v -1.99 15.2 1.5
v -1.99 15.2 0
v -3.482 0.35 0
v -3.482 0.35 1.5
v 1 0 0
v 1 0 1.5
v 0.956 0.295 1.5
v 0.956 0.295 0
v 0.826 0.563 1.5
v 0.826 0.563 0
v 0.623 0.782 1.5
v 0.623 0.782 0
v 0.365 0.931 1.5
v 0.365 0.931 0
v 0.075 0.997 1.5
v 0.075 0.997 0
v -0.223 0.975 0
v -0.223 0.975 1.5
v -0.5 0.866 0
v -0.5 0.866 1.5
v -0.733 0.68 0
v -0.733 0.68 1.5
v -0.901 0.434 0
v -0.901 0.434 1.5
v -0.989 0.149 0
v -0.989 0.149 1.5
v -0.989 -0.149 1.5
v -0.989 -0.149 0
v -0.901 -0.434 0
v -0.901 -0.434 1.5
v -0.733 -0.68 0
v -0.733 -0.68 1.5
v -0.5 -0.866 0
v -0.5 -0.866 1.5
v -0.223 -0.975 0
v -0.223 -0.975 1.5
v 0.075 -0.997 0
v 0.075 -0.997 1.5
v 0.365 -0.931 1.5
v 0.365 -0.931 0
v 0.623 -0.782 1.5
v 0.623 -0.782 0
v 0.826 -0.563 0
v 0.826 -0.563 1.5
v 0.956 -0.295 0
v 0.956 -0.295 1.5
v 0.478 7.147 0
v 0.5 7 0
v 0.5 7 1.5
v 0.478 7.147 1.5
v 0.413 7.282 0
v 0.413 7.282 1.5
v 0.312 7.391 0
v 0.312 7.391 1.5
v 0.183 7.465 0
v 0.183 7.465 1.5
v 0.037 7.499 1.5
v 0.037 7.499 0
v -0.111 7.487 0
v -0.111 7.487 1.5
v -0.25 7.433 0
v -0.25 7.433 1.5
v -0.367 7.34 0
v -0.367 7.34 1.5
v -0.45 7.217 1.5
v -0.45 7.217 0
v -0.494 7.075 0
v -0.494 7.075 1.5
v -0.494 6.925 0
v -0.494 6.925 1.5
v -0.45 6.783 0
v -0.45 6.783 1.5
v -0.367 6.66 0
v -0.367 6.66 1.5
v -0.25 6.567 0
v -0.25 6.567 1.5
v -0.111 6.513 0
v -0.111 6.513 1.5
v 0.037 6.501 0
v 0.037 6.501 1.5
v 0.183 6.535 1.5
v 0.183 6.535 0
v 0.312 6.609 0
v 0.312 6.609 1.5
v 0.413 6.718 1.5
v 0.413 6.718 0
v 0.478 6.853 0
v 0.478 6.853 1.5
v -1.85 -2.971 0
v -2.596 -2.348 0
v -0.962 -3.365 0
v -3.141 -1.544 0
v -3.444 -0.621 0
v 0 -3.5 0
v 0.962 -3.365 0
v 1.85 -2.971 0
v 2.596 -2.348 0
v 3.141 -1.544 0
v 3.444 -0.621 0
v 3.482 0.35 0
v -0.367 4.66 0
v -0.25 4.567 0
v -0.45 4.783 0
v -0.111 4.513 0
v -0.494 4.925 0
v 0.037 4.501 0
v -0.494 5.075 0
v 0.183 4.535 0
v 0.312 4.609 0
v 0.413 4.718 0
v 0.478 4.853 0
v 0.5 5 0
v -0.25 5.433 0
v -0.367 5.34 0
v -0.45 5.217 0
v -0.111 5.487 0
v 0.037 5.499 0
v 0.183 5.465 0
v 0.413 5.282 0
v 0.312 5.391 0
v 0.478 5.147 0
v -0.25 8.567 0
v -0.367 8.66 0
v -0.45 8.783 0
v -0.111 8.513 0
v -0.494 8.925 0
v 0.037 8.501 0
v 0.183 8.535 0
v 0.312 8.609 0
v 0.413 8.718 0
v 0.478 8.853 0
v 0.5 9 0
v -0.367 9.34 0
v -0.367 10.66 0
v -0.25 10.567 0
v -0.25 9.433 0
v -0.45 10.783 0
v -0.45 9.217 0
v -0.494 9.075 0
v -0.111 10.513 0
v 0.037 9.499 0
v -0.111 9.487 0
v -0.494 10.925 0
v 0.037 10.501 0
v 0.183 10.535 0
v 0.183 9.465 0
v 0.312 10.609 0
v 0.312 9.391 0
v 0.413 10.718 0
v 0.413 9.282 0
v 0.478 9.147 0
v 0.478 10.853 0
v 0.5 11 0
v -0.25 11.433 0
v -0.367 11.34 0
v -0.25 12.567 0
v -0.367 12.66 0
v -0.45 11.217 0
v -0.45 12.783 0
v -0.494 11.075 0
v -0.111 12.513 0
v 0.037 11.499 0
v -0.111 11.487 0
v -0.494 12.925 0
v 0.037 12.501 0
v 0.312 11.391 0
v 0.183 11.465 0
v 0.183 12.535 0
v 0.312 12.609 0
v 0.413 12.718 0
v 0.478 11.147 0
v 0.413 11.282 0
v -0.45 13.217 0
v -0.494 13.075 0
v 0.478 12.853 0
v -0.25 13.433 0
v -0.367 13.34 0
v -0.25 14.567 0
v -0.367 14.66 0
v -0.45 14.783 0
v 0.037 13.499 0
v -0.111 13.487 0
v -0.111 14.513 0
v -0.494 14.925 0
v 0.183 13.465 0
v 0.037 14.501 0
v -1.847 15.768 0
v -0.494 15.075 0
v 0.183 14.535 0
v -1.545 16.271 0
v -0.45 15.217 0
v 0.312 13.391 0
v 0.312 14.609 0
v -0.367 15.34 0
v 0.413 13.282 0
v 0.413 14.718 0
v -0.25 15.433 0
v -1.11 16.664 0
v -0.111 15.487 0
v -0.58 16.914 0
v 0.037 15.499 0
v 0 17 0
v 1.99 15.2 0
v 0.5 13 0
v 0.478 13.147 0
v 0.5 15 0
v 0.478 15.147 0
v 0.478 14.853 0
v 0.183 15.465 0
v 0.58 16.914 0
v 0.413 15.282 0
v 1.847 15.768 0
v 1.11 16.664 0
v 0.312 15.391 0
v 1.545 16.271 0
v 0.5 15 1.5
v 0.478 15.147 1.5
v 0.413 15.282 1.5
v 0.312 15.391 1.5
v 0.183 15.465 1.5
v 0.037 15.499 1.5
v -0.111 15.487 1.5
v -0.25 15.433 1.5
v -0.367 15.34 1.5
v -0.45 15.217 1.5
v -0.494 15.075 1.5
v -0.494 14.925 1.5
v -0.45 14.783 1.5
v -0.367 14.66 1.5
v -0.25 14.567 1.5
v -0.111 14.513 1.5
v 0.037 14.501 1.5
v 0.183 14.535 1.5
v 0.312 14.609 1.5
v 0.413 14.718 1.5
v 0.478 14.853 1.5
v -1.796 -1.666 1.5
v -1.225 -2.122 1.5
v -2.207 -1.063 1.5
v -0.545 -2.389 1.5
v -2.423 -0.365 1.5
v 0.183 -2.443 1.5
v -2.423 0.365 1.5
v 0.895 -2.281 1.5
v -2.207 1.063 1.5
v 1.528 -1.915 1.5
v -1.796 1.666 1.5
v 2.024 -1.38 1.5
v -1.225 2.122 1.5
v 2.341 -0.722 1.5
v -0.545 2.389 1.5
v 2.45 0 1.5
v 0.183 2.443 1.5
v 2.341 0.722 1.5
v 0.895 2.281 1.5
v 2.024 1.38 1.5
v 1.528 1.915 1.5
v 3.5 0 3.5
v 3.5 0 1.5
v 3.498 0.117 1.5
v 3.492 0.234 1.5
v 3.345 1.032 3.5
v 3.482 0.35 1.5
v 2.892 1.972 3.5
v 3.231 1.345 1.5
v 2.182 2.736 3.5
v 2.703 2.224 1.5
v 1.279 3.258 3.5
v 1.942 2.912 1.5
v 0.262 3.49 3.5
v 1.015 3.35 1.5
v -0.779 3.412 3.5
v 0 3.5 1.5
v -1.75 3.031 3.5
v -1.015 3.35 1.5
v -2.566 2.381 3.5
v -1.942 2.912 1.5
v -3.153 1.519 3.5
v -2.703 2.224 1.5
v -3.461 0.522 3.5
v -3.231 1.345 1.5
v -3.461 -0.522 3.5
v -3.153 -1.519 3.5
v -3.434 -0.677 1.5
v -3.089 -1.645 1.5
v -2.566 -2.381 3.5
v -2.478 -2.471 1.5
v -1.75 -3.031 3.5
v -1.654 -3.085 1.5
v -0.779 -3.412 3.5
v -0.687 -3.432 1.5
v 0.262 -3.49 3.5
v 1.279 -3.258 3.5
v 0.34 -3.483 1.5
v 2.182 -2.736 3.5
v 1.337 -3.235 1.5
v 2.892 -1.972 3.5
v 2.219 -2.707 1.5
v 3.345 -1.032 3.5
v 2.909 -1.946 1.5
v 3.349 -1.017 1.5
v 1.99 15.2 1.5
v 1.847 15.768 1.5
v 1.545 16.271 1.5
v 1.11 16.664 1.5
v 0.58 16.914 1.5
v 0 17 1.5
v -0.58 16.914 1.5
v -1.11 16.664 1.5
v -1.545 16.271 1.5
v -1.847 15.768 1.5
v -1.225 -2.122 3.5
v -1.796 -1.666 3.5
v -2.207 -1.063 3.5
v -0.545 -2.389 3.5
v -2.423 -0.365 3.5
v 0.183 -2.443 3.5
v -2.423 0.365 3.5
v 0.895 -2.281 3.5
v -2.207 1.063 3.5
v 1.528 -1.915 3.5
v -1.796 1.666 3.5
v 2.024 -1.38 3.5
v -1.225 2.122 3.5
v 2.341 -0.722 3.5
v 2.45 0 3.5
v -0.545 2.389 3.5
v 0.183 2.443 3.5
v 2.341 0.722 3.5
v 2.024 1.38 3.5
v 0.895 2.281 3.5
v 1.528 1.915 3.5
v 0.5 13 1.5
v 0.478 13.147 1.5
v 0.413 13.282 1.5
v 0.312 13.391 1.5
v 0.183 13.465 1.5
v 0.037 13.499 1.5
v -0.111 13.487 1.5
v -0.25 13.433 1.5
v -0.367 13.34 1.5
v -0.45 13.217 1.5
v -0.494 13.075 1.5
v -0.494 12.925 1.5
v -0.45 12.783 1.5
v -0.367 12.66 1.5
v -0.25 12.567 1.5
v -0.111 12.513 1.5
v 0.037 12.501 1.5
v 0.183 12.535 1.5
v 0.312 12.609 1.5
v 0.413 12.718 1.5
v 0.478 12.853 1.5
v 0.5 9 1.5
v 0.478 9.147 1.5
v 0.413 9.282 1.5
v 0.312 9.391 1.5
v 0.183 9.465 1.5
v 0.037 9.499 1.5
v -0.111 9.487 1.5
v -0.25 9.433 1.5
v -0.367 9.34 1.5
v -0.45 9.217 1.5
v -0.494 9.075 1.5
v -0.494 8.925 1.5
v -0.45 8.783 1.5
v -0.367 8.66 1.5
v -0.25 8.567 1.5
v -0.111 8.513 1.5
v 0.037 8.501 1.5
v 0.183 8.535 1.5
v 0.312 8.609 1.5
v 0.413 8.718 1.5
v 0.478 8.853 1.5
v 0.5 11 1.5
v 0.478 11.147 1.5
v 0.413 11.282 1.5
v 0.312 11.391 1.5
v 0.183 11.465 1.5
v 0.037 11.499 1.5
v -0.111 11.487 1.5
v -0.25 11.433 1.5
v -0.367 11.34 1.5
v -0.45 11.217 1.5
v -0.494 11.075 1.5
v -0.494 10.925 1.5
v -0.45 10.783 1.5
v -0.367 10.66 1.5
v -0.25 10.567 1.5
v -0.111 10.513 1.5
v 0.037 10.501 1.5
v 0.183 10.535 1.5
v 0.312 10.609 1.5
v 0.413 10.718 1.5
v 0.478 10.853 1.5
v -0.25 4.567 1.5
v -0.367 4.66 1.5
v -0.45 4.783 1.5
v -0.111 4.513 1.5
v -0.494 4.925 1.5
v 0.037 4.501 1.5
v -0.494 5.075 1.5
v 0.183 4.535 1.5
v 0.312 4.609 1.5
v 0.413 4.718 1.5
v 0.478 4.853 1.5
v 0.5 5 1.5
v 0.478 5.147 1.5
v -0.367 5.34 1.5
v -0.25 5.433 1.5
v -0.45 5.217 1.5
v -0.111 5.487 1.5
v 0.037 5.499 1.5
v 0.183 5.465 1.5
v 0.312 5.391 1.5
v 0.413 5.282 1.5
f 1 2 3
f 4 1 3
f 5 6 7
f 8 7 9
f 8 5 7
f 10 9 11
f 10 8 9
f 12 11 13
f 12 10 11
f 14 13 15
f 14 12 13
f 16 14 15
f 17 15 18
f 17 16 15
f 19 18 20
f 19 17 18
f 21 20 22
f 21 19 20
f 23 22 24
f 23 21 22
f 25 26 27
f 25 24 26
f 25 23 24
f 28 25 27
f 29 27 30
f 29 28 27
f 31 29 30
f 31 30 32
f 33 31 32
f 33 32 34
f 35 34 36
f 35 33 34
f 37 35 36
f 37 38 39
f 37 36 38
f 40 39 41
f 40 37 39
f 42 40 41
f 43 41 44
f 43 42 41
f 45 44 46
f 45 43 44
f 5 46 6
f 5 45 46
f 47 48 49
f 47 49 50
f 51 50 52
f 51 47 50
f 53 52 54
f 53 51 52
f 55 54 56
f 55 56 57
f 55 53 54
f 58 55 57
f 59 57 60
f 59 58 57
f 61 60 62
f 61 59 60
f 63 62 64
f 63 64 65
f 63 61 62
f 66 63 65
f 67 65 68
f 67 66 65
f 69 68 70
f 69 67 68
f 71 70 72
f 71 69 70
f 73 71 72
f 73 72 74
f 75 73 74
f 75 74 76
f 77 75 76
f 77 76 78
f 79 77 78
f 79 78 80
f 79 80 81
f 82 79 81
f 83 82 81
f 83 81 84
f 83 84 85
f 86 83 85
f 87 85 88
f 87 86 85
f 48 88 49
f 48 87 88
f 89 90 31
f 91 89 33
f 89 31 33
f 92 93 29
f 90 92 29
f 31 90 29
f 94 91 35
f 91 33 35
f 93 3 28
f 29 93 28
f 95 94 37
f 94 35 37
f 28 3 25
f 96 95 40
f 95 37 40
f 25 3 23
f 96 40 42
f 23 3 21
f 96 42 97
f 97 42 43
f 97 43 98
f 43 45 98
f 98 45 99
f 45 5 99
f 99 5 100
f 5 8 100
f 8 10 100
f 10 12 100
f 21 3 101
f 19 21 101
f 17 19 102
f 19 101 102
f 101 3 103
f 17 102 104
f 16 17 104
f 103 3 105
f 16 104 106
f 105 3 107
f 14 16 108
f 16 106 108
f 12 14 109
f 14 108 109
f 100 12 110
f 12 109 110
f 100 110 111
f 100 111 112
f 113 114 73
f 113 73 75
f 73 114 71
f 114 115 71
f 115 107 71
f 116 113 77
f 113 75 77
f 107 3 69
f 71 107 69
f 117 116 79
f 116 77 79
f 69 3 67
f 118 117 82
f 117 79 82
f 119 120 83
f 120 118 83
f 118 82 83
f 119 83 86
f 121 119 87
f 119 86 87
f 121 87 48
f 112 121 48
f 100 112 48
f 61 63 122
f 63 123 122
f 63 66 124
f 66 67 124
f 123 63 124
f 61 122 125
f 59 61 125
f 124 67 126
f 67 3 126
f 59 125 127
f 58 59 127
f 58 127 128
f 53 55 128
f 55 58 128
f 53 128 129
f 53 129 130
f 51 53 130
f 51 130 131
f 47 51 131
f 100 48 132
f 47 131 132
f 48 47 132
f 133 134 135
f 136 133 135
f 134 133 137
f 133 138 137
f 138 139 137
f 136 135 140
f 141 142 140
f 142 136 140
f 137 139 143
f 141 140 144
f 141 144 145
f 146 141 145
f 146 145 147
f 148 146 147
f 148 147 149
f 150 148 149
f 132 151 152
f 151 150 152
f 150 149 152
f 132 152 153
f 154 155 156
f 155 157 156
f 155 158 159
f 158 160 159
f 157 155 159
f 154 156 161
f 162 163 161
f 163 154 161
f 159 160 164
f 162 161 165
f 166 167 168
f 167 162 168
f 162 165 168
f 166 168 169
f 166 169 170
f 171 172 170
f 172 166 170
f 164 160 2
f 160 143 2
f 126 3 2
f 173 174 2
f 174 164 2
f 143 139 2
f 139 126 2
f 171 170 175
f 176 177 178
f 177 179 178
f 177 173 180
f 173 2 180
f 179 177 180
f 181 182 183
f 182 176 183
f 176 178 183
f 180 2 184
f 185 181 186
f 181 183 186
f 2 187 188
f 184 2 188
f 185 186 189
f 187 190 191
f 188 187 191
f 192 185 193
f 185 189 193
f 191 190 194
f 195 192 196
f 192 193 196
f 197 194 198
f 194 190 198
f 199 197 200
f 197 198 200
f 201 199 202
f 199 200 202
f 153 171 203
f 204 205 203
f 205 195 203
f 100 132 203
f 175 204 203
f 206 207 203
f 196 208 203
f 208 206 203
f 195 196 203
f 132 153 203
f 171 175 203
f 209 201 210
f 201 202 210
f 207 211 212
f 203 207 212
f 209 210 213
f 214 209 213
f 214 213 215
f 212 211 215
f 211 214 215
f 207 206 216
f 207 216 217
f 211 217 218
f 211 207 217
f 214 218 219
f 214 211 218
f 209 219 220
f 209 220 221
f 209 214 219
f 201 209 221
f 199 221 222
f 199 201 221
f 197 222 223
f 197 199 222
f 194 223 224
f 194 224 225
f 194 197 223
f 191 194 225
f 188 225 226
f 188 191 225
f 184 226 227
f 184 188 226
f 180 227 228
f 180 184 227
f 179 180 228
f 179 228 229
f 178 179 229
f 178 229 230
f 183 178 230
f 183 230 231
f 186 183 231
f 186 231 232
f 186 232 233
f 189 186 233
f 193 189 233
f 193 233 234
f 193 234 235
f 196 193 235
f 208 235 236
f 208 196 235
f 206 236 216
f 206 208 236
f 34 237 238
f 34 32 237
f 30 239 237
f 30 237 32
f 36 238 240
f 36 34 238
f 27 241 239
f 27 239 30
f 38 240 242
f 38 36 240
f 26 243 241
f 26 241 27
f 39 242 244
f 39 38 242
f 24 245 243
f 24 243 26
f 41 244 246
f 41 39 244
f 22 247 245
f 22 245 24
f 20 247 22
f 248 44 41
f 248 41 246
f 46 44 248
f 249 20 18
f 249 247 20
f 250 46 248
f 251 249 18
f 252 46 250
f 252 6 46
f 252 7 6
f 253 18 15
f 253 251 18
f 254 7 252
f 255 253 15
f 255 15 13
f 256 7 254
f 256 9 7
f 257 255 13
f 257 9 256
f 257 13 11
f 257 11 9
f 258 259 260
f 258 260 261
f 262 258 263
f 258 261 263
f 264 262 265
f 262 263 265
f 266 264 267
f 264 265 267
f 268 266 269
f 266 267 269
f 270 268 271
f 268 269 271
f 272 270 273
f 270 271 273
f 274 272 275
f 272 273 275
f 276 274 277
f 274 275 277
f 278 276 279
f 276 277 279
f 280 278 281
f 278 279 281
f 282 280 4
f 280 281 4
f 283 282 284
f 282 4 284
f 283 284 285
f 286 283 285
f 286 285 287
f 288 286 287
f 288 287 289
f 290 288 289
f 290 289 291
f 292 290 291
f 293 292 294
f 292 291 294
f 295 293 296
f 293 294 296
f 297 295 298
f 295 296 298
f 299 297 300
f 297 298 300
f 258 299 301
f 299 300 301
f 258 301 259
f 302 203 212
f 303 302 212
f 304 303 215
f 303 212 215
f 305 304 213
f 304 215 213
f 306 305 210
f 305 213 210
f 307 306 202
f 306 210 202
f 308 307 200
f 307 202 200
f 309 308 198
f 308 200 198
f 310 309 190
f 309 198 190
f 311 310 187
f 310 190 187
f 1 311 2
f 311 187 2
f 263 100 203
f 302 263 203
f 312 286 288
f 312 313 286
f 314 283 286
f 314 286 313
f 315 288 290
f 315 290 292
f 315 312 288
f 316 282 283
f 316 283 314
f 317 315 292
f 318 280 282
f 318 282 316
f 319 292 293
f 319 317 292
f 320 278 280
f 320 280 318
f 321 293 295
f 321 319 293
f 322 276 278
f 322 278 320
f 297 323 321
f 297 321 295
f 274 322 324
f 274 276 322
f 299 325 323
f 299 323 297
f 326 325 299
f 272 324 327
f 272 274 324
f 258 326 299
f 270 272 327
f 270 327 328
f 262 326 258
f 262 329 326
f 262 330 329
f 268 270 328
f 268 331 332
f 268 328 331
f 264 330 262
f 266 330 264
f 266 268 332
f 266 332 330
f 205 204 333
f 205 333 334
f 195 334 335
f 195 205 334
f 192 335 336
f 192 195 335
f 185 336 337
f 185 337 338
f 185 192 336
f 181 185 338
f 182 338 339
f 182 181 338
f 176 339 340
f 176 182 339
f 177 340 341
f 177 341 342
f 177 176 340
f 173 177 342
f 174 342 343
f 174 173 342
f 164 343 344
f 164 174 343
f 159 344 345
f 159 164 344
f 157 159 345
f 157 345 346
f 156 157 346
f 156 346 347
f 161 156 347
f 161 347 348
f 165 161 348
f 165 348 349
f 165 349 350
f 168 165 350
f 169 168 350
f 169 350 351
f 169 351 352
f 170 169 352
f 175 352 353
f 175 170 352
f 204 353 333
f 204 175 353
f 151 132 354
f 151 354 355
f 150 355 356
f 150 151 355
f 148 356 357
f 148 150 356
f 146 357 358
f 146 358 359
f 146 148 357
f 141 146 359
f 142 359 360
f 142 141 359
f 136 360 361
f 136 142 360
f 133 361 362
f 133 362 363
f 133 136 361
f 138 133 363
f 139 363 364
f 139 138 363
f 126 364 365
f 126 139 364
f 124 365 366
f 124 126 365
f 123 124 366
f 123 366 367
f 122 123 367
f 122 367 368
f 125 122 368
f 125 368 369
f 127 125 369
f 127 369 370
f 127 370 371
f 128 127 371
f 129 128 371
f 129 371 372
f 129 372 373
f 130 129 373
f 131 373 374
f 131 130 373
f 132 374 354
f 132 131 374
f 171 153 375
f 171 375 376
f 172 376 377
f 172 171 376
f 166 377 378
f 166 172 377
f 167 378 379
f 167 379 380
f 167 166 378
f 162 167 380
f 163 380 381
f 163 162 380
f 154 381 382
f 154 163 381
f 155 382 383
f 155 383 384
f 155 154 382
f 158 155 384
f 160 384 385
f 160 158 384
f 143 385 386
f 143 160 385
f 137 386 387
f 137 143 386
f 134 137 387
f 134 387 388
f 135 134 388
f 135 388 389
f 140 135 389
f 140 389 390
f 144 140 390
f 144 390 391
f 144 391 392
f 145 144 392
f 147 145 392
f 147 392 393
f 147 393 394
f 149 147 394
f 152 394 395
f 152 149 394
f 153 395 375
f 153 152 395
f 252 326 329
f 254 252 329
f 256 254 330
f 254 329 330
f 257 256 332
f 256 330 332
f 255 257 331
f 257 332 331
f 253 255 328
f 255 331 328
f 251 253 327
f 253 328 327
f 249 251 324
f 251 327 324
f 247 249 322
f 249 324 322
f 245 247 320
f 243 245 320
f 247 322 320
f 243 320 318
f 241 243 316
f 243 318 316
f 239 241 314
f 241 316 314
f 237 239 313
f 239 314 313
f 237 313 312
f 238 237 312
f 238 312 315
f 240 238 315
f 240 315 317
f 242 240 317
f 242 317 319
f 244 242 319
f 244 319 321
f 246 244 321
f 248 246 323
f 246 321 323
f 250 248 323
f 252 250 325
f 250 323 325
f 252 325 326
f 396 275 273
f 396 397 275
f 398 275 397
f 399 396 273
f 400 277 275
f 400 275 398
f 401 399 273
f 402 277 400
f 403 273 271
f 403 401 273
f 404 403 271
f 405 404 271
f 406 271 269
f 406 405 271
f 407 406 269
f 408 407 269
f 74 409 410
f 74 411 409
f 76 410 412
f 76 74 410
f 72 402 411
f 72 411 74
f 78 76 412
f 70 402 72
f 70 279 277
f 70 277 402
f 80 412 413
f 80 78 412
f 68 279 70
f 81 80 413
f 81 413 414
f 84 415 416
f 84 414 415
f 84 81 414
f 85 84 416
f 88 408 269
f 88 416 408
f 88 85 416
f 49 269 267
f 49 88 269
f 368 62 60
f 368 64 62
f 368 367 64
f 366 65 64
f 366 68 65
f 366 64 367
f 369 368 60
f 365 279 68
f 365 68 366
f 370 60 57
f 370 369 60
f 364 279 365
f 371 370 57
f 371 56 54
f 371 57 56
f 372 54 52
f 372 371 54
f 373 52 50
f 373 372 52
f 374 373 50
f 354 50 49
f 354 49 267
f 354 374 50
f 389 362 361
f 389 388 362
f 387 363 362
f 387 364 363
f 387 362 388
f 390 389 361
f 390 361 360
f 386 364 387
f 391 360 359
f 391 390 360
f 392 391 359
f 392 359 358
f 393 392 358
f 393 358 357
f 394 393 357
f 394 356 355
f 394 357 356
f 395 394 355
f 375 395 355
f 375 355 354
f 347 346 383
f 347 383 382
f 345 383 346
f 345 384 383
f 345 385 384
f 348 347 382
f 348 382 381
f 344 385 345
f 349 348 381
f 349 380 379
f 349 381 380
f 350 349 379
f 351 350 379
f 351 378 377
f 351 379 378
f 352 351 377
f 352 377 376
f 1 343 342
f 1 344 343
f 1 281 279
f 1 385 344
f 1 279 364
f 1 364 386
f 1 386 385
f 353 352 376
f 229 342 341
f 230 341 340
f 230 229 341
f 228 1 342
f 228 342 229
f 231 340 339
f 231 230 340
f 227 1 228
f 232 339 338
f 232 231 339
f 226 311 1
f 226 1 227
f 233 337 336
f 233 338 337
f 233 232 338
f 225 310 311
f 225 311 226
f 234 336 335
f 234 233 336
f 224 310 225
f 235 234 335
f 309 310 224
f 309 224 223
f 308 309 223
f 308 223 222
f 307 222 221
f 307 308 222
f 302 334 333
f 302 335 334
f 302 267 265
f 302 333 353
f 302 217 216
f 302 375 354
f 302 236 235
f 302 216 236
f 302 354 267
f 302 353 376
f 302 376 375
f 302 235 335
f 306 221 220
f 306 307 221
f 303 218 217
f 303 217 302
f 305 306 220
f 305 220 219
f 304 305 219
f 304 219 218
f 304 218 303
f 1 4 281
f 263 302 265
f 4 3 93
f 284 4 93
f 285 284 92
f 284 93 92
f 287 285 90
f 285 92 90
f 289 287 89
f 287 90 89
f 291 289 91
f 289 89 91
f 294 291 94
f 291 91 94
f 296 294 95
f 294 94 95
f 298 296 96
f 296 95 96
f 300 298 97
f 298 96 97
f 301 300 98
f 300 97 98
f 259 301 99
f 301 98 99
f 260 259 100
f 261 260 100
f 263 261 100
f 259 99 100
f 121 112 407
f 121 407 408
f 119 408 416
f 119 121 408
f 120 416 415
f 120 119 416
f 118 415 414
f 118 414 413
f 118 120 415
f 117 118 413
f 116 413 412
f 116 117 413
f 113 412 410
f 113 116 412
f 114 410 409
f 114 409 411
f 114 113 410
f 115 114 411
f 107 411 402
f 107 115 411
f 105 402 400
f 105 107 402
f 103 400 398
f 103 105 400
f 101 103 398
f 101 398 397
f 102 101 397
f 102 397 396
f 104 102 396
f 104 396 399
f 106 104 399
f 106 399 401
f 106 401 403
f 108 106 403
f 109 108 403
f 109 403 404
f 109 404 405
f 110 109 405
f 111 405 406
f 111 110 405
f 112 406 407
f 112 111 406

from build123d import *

# Parameters (mm, degrees)
ESQUISSE1_R             = 1
ESQUISSE1_R_2           = 0.5
BOSS_EXTRU_1_DEPTH      = 1.5
ESQUISSE3_R             = 3.5
ESQUISSE3_R_2           = 1
BOSS_EXTRU_2_DEPTH      = 2
ESQUISSE4_R             = 2.45
ENL_V_MAT_EXTRU_1_DEPTH = 2


with BuildPart() as part:
    # Esquisse1 → Boss.-Extru.1 (new body)
    with BuildSketch(Plane.XY):
        with BuildLine():
            Line((-1.989974874, 15.2), (-3.48245603, 0.35))
            ThreePointArc((-3.48245603, 0.35), (0, -3.5), (3.48245603, 0.35))
            Line((3.48245603, 0.35), (1.989974874, 15.2))
            ThreePointArc((1.989974874, 15.2), (0, 17), (-1.989974874, 15.2))
        make_face()
        Circle(ESQUISSE1_R, mode=Mode.SUBTRACT)
        with Locations((0, 15)):
            Circle(ESQUISSE1_R_2, mode=Mode.SUBTRACT)
        with Locations((0, 13)):
            Circle(ESQUISSE1_R_2, mode=Mode.SUBTRACT)
        with Locations((0, 11)):
            Circle(ESQUISSE1_R_2, mode=Mode.SUBTRACT)
        with Locations((0, 9)):
            Circle(ESQUISSE1_R_2, mode=Mode.SUBTRACT)
        with Locations((0, 7)):
            Circle(ESQUISSE1_R_2, mode=Mode.SUBTRACT)
        with Locations((0, 5)):
            Circle(ESQUISSE1_R_2, mode=Mode.SUBTRACT)
    extrude(amount=BOSS_EXTRU_1_DEPTH)

    # Esquisse3 → Boss.-Extru.2 (add)
    with BuildSketch(Plane.XY.offset(1.5)):
        Circle(ESQUISSE3_R)
        Circle(ESQUISSE3_R_2, mode=Mode.SUBTRACT)
    extrude(amount=BOSS_EXTRU_2_DEPTH)

    # Esquisse4 → Enlèv. mat.-Extru.1 (cut)
    with BuildSketch(Plane.XY.offset(3.5)):
        Circle(ESQUISSE4_R)
    extrude(amount=-ENL_V_MAT_EXTRU_1_DEPTH, mode=Mode.SUBTRACT)


solid = part.part
